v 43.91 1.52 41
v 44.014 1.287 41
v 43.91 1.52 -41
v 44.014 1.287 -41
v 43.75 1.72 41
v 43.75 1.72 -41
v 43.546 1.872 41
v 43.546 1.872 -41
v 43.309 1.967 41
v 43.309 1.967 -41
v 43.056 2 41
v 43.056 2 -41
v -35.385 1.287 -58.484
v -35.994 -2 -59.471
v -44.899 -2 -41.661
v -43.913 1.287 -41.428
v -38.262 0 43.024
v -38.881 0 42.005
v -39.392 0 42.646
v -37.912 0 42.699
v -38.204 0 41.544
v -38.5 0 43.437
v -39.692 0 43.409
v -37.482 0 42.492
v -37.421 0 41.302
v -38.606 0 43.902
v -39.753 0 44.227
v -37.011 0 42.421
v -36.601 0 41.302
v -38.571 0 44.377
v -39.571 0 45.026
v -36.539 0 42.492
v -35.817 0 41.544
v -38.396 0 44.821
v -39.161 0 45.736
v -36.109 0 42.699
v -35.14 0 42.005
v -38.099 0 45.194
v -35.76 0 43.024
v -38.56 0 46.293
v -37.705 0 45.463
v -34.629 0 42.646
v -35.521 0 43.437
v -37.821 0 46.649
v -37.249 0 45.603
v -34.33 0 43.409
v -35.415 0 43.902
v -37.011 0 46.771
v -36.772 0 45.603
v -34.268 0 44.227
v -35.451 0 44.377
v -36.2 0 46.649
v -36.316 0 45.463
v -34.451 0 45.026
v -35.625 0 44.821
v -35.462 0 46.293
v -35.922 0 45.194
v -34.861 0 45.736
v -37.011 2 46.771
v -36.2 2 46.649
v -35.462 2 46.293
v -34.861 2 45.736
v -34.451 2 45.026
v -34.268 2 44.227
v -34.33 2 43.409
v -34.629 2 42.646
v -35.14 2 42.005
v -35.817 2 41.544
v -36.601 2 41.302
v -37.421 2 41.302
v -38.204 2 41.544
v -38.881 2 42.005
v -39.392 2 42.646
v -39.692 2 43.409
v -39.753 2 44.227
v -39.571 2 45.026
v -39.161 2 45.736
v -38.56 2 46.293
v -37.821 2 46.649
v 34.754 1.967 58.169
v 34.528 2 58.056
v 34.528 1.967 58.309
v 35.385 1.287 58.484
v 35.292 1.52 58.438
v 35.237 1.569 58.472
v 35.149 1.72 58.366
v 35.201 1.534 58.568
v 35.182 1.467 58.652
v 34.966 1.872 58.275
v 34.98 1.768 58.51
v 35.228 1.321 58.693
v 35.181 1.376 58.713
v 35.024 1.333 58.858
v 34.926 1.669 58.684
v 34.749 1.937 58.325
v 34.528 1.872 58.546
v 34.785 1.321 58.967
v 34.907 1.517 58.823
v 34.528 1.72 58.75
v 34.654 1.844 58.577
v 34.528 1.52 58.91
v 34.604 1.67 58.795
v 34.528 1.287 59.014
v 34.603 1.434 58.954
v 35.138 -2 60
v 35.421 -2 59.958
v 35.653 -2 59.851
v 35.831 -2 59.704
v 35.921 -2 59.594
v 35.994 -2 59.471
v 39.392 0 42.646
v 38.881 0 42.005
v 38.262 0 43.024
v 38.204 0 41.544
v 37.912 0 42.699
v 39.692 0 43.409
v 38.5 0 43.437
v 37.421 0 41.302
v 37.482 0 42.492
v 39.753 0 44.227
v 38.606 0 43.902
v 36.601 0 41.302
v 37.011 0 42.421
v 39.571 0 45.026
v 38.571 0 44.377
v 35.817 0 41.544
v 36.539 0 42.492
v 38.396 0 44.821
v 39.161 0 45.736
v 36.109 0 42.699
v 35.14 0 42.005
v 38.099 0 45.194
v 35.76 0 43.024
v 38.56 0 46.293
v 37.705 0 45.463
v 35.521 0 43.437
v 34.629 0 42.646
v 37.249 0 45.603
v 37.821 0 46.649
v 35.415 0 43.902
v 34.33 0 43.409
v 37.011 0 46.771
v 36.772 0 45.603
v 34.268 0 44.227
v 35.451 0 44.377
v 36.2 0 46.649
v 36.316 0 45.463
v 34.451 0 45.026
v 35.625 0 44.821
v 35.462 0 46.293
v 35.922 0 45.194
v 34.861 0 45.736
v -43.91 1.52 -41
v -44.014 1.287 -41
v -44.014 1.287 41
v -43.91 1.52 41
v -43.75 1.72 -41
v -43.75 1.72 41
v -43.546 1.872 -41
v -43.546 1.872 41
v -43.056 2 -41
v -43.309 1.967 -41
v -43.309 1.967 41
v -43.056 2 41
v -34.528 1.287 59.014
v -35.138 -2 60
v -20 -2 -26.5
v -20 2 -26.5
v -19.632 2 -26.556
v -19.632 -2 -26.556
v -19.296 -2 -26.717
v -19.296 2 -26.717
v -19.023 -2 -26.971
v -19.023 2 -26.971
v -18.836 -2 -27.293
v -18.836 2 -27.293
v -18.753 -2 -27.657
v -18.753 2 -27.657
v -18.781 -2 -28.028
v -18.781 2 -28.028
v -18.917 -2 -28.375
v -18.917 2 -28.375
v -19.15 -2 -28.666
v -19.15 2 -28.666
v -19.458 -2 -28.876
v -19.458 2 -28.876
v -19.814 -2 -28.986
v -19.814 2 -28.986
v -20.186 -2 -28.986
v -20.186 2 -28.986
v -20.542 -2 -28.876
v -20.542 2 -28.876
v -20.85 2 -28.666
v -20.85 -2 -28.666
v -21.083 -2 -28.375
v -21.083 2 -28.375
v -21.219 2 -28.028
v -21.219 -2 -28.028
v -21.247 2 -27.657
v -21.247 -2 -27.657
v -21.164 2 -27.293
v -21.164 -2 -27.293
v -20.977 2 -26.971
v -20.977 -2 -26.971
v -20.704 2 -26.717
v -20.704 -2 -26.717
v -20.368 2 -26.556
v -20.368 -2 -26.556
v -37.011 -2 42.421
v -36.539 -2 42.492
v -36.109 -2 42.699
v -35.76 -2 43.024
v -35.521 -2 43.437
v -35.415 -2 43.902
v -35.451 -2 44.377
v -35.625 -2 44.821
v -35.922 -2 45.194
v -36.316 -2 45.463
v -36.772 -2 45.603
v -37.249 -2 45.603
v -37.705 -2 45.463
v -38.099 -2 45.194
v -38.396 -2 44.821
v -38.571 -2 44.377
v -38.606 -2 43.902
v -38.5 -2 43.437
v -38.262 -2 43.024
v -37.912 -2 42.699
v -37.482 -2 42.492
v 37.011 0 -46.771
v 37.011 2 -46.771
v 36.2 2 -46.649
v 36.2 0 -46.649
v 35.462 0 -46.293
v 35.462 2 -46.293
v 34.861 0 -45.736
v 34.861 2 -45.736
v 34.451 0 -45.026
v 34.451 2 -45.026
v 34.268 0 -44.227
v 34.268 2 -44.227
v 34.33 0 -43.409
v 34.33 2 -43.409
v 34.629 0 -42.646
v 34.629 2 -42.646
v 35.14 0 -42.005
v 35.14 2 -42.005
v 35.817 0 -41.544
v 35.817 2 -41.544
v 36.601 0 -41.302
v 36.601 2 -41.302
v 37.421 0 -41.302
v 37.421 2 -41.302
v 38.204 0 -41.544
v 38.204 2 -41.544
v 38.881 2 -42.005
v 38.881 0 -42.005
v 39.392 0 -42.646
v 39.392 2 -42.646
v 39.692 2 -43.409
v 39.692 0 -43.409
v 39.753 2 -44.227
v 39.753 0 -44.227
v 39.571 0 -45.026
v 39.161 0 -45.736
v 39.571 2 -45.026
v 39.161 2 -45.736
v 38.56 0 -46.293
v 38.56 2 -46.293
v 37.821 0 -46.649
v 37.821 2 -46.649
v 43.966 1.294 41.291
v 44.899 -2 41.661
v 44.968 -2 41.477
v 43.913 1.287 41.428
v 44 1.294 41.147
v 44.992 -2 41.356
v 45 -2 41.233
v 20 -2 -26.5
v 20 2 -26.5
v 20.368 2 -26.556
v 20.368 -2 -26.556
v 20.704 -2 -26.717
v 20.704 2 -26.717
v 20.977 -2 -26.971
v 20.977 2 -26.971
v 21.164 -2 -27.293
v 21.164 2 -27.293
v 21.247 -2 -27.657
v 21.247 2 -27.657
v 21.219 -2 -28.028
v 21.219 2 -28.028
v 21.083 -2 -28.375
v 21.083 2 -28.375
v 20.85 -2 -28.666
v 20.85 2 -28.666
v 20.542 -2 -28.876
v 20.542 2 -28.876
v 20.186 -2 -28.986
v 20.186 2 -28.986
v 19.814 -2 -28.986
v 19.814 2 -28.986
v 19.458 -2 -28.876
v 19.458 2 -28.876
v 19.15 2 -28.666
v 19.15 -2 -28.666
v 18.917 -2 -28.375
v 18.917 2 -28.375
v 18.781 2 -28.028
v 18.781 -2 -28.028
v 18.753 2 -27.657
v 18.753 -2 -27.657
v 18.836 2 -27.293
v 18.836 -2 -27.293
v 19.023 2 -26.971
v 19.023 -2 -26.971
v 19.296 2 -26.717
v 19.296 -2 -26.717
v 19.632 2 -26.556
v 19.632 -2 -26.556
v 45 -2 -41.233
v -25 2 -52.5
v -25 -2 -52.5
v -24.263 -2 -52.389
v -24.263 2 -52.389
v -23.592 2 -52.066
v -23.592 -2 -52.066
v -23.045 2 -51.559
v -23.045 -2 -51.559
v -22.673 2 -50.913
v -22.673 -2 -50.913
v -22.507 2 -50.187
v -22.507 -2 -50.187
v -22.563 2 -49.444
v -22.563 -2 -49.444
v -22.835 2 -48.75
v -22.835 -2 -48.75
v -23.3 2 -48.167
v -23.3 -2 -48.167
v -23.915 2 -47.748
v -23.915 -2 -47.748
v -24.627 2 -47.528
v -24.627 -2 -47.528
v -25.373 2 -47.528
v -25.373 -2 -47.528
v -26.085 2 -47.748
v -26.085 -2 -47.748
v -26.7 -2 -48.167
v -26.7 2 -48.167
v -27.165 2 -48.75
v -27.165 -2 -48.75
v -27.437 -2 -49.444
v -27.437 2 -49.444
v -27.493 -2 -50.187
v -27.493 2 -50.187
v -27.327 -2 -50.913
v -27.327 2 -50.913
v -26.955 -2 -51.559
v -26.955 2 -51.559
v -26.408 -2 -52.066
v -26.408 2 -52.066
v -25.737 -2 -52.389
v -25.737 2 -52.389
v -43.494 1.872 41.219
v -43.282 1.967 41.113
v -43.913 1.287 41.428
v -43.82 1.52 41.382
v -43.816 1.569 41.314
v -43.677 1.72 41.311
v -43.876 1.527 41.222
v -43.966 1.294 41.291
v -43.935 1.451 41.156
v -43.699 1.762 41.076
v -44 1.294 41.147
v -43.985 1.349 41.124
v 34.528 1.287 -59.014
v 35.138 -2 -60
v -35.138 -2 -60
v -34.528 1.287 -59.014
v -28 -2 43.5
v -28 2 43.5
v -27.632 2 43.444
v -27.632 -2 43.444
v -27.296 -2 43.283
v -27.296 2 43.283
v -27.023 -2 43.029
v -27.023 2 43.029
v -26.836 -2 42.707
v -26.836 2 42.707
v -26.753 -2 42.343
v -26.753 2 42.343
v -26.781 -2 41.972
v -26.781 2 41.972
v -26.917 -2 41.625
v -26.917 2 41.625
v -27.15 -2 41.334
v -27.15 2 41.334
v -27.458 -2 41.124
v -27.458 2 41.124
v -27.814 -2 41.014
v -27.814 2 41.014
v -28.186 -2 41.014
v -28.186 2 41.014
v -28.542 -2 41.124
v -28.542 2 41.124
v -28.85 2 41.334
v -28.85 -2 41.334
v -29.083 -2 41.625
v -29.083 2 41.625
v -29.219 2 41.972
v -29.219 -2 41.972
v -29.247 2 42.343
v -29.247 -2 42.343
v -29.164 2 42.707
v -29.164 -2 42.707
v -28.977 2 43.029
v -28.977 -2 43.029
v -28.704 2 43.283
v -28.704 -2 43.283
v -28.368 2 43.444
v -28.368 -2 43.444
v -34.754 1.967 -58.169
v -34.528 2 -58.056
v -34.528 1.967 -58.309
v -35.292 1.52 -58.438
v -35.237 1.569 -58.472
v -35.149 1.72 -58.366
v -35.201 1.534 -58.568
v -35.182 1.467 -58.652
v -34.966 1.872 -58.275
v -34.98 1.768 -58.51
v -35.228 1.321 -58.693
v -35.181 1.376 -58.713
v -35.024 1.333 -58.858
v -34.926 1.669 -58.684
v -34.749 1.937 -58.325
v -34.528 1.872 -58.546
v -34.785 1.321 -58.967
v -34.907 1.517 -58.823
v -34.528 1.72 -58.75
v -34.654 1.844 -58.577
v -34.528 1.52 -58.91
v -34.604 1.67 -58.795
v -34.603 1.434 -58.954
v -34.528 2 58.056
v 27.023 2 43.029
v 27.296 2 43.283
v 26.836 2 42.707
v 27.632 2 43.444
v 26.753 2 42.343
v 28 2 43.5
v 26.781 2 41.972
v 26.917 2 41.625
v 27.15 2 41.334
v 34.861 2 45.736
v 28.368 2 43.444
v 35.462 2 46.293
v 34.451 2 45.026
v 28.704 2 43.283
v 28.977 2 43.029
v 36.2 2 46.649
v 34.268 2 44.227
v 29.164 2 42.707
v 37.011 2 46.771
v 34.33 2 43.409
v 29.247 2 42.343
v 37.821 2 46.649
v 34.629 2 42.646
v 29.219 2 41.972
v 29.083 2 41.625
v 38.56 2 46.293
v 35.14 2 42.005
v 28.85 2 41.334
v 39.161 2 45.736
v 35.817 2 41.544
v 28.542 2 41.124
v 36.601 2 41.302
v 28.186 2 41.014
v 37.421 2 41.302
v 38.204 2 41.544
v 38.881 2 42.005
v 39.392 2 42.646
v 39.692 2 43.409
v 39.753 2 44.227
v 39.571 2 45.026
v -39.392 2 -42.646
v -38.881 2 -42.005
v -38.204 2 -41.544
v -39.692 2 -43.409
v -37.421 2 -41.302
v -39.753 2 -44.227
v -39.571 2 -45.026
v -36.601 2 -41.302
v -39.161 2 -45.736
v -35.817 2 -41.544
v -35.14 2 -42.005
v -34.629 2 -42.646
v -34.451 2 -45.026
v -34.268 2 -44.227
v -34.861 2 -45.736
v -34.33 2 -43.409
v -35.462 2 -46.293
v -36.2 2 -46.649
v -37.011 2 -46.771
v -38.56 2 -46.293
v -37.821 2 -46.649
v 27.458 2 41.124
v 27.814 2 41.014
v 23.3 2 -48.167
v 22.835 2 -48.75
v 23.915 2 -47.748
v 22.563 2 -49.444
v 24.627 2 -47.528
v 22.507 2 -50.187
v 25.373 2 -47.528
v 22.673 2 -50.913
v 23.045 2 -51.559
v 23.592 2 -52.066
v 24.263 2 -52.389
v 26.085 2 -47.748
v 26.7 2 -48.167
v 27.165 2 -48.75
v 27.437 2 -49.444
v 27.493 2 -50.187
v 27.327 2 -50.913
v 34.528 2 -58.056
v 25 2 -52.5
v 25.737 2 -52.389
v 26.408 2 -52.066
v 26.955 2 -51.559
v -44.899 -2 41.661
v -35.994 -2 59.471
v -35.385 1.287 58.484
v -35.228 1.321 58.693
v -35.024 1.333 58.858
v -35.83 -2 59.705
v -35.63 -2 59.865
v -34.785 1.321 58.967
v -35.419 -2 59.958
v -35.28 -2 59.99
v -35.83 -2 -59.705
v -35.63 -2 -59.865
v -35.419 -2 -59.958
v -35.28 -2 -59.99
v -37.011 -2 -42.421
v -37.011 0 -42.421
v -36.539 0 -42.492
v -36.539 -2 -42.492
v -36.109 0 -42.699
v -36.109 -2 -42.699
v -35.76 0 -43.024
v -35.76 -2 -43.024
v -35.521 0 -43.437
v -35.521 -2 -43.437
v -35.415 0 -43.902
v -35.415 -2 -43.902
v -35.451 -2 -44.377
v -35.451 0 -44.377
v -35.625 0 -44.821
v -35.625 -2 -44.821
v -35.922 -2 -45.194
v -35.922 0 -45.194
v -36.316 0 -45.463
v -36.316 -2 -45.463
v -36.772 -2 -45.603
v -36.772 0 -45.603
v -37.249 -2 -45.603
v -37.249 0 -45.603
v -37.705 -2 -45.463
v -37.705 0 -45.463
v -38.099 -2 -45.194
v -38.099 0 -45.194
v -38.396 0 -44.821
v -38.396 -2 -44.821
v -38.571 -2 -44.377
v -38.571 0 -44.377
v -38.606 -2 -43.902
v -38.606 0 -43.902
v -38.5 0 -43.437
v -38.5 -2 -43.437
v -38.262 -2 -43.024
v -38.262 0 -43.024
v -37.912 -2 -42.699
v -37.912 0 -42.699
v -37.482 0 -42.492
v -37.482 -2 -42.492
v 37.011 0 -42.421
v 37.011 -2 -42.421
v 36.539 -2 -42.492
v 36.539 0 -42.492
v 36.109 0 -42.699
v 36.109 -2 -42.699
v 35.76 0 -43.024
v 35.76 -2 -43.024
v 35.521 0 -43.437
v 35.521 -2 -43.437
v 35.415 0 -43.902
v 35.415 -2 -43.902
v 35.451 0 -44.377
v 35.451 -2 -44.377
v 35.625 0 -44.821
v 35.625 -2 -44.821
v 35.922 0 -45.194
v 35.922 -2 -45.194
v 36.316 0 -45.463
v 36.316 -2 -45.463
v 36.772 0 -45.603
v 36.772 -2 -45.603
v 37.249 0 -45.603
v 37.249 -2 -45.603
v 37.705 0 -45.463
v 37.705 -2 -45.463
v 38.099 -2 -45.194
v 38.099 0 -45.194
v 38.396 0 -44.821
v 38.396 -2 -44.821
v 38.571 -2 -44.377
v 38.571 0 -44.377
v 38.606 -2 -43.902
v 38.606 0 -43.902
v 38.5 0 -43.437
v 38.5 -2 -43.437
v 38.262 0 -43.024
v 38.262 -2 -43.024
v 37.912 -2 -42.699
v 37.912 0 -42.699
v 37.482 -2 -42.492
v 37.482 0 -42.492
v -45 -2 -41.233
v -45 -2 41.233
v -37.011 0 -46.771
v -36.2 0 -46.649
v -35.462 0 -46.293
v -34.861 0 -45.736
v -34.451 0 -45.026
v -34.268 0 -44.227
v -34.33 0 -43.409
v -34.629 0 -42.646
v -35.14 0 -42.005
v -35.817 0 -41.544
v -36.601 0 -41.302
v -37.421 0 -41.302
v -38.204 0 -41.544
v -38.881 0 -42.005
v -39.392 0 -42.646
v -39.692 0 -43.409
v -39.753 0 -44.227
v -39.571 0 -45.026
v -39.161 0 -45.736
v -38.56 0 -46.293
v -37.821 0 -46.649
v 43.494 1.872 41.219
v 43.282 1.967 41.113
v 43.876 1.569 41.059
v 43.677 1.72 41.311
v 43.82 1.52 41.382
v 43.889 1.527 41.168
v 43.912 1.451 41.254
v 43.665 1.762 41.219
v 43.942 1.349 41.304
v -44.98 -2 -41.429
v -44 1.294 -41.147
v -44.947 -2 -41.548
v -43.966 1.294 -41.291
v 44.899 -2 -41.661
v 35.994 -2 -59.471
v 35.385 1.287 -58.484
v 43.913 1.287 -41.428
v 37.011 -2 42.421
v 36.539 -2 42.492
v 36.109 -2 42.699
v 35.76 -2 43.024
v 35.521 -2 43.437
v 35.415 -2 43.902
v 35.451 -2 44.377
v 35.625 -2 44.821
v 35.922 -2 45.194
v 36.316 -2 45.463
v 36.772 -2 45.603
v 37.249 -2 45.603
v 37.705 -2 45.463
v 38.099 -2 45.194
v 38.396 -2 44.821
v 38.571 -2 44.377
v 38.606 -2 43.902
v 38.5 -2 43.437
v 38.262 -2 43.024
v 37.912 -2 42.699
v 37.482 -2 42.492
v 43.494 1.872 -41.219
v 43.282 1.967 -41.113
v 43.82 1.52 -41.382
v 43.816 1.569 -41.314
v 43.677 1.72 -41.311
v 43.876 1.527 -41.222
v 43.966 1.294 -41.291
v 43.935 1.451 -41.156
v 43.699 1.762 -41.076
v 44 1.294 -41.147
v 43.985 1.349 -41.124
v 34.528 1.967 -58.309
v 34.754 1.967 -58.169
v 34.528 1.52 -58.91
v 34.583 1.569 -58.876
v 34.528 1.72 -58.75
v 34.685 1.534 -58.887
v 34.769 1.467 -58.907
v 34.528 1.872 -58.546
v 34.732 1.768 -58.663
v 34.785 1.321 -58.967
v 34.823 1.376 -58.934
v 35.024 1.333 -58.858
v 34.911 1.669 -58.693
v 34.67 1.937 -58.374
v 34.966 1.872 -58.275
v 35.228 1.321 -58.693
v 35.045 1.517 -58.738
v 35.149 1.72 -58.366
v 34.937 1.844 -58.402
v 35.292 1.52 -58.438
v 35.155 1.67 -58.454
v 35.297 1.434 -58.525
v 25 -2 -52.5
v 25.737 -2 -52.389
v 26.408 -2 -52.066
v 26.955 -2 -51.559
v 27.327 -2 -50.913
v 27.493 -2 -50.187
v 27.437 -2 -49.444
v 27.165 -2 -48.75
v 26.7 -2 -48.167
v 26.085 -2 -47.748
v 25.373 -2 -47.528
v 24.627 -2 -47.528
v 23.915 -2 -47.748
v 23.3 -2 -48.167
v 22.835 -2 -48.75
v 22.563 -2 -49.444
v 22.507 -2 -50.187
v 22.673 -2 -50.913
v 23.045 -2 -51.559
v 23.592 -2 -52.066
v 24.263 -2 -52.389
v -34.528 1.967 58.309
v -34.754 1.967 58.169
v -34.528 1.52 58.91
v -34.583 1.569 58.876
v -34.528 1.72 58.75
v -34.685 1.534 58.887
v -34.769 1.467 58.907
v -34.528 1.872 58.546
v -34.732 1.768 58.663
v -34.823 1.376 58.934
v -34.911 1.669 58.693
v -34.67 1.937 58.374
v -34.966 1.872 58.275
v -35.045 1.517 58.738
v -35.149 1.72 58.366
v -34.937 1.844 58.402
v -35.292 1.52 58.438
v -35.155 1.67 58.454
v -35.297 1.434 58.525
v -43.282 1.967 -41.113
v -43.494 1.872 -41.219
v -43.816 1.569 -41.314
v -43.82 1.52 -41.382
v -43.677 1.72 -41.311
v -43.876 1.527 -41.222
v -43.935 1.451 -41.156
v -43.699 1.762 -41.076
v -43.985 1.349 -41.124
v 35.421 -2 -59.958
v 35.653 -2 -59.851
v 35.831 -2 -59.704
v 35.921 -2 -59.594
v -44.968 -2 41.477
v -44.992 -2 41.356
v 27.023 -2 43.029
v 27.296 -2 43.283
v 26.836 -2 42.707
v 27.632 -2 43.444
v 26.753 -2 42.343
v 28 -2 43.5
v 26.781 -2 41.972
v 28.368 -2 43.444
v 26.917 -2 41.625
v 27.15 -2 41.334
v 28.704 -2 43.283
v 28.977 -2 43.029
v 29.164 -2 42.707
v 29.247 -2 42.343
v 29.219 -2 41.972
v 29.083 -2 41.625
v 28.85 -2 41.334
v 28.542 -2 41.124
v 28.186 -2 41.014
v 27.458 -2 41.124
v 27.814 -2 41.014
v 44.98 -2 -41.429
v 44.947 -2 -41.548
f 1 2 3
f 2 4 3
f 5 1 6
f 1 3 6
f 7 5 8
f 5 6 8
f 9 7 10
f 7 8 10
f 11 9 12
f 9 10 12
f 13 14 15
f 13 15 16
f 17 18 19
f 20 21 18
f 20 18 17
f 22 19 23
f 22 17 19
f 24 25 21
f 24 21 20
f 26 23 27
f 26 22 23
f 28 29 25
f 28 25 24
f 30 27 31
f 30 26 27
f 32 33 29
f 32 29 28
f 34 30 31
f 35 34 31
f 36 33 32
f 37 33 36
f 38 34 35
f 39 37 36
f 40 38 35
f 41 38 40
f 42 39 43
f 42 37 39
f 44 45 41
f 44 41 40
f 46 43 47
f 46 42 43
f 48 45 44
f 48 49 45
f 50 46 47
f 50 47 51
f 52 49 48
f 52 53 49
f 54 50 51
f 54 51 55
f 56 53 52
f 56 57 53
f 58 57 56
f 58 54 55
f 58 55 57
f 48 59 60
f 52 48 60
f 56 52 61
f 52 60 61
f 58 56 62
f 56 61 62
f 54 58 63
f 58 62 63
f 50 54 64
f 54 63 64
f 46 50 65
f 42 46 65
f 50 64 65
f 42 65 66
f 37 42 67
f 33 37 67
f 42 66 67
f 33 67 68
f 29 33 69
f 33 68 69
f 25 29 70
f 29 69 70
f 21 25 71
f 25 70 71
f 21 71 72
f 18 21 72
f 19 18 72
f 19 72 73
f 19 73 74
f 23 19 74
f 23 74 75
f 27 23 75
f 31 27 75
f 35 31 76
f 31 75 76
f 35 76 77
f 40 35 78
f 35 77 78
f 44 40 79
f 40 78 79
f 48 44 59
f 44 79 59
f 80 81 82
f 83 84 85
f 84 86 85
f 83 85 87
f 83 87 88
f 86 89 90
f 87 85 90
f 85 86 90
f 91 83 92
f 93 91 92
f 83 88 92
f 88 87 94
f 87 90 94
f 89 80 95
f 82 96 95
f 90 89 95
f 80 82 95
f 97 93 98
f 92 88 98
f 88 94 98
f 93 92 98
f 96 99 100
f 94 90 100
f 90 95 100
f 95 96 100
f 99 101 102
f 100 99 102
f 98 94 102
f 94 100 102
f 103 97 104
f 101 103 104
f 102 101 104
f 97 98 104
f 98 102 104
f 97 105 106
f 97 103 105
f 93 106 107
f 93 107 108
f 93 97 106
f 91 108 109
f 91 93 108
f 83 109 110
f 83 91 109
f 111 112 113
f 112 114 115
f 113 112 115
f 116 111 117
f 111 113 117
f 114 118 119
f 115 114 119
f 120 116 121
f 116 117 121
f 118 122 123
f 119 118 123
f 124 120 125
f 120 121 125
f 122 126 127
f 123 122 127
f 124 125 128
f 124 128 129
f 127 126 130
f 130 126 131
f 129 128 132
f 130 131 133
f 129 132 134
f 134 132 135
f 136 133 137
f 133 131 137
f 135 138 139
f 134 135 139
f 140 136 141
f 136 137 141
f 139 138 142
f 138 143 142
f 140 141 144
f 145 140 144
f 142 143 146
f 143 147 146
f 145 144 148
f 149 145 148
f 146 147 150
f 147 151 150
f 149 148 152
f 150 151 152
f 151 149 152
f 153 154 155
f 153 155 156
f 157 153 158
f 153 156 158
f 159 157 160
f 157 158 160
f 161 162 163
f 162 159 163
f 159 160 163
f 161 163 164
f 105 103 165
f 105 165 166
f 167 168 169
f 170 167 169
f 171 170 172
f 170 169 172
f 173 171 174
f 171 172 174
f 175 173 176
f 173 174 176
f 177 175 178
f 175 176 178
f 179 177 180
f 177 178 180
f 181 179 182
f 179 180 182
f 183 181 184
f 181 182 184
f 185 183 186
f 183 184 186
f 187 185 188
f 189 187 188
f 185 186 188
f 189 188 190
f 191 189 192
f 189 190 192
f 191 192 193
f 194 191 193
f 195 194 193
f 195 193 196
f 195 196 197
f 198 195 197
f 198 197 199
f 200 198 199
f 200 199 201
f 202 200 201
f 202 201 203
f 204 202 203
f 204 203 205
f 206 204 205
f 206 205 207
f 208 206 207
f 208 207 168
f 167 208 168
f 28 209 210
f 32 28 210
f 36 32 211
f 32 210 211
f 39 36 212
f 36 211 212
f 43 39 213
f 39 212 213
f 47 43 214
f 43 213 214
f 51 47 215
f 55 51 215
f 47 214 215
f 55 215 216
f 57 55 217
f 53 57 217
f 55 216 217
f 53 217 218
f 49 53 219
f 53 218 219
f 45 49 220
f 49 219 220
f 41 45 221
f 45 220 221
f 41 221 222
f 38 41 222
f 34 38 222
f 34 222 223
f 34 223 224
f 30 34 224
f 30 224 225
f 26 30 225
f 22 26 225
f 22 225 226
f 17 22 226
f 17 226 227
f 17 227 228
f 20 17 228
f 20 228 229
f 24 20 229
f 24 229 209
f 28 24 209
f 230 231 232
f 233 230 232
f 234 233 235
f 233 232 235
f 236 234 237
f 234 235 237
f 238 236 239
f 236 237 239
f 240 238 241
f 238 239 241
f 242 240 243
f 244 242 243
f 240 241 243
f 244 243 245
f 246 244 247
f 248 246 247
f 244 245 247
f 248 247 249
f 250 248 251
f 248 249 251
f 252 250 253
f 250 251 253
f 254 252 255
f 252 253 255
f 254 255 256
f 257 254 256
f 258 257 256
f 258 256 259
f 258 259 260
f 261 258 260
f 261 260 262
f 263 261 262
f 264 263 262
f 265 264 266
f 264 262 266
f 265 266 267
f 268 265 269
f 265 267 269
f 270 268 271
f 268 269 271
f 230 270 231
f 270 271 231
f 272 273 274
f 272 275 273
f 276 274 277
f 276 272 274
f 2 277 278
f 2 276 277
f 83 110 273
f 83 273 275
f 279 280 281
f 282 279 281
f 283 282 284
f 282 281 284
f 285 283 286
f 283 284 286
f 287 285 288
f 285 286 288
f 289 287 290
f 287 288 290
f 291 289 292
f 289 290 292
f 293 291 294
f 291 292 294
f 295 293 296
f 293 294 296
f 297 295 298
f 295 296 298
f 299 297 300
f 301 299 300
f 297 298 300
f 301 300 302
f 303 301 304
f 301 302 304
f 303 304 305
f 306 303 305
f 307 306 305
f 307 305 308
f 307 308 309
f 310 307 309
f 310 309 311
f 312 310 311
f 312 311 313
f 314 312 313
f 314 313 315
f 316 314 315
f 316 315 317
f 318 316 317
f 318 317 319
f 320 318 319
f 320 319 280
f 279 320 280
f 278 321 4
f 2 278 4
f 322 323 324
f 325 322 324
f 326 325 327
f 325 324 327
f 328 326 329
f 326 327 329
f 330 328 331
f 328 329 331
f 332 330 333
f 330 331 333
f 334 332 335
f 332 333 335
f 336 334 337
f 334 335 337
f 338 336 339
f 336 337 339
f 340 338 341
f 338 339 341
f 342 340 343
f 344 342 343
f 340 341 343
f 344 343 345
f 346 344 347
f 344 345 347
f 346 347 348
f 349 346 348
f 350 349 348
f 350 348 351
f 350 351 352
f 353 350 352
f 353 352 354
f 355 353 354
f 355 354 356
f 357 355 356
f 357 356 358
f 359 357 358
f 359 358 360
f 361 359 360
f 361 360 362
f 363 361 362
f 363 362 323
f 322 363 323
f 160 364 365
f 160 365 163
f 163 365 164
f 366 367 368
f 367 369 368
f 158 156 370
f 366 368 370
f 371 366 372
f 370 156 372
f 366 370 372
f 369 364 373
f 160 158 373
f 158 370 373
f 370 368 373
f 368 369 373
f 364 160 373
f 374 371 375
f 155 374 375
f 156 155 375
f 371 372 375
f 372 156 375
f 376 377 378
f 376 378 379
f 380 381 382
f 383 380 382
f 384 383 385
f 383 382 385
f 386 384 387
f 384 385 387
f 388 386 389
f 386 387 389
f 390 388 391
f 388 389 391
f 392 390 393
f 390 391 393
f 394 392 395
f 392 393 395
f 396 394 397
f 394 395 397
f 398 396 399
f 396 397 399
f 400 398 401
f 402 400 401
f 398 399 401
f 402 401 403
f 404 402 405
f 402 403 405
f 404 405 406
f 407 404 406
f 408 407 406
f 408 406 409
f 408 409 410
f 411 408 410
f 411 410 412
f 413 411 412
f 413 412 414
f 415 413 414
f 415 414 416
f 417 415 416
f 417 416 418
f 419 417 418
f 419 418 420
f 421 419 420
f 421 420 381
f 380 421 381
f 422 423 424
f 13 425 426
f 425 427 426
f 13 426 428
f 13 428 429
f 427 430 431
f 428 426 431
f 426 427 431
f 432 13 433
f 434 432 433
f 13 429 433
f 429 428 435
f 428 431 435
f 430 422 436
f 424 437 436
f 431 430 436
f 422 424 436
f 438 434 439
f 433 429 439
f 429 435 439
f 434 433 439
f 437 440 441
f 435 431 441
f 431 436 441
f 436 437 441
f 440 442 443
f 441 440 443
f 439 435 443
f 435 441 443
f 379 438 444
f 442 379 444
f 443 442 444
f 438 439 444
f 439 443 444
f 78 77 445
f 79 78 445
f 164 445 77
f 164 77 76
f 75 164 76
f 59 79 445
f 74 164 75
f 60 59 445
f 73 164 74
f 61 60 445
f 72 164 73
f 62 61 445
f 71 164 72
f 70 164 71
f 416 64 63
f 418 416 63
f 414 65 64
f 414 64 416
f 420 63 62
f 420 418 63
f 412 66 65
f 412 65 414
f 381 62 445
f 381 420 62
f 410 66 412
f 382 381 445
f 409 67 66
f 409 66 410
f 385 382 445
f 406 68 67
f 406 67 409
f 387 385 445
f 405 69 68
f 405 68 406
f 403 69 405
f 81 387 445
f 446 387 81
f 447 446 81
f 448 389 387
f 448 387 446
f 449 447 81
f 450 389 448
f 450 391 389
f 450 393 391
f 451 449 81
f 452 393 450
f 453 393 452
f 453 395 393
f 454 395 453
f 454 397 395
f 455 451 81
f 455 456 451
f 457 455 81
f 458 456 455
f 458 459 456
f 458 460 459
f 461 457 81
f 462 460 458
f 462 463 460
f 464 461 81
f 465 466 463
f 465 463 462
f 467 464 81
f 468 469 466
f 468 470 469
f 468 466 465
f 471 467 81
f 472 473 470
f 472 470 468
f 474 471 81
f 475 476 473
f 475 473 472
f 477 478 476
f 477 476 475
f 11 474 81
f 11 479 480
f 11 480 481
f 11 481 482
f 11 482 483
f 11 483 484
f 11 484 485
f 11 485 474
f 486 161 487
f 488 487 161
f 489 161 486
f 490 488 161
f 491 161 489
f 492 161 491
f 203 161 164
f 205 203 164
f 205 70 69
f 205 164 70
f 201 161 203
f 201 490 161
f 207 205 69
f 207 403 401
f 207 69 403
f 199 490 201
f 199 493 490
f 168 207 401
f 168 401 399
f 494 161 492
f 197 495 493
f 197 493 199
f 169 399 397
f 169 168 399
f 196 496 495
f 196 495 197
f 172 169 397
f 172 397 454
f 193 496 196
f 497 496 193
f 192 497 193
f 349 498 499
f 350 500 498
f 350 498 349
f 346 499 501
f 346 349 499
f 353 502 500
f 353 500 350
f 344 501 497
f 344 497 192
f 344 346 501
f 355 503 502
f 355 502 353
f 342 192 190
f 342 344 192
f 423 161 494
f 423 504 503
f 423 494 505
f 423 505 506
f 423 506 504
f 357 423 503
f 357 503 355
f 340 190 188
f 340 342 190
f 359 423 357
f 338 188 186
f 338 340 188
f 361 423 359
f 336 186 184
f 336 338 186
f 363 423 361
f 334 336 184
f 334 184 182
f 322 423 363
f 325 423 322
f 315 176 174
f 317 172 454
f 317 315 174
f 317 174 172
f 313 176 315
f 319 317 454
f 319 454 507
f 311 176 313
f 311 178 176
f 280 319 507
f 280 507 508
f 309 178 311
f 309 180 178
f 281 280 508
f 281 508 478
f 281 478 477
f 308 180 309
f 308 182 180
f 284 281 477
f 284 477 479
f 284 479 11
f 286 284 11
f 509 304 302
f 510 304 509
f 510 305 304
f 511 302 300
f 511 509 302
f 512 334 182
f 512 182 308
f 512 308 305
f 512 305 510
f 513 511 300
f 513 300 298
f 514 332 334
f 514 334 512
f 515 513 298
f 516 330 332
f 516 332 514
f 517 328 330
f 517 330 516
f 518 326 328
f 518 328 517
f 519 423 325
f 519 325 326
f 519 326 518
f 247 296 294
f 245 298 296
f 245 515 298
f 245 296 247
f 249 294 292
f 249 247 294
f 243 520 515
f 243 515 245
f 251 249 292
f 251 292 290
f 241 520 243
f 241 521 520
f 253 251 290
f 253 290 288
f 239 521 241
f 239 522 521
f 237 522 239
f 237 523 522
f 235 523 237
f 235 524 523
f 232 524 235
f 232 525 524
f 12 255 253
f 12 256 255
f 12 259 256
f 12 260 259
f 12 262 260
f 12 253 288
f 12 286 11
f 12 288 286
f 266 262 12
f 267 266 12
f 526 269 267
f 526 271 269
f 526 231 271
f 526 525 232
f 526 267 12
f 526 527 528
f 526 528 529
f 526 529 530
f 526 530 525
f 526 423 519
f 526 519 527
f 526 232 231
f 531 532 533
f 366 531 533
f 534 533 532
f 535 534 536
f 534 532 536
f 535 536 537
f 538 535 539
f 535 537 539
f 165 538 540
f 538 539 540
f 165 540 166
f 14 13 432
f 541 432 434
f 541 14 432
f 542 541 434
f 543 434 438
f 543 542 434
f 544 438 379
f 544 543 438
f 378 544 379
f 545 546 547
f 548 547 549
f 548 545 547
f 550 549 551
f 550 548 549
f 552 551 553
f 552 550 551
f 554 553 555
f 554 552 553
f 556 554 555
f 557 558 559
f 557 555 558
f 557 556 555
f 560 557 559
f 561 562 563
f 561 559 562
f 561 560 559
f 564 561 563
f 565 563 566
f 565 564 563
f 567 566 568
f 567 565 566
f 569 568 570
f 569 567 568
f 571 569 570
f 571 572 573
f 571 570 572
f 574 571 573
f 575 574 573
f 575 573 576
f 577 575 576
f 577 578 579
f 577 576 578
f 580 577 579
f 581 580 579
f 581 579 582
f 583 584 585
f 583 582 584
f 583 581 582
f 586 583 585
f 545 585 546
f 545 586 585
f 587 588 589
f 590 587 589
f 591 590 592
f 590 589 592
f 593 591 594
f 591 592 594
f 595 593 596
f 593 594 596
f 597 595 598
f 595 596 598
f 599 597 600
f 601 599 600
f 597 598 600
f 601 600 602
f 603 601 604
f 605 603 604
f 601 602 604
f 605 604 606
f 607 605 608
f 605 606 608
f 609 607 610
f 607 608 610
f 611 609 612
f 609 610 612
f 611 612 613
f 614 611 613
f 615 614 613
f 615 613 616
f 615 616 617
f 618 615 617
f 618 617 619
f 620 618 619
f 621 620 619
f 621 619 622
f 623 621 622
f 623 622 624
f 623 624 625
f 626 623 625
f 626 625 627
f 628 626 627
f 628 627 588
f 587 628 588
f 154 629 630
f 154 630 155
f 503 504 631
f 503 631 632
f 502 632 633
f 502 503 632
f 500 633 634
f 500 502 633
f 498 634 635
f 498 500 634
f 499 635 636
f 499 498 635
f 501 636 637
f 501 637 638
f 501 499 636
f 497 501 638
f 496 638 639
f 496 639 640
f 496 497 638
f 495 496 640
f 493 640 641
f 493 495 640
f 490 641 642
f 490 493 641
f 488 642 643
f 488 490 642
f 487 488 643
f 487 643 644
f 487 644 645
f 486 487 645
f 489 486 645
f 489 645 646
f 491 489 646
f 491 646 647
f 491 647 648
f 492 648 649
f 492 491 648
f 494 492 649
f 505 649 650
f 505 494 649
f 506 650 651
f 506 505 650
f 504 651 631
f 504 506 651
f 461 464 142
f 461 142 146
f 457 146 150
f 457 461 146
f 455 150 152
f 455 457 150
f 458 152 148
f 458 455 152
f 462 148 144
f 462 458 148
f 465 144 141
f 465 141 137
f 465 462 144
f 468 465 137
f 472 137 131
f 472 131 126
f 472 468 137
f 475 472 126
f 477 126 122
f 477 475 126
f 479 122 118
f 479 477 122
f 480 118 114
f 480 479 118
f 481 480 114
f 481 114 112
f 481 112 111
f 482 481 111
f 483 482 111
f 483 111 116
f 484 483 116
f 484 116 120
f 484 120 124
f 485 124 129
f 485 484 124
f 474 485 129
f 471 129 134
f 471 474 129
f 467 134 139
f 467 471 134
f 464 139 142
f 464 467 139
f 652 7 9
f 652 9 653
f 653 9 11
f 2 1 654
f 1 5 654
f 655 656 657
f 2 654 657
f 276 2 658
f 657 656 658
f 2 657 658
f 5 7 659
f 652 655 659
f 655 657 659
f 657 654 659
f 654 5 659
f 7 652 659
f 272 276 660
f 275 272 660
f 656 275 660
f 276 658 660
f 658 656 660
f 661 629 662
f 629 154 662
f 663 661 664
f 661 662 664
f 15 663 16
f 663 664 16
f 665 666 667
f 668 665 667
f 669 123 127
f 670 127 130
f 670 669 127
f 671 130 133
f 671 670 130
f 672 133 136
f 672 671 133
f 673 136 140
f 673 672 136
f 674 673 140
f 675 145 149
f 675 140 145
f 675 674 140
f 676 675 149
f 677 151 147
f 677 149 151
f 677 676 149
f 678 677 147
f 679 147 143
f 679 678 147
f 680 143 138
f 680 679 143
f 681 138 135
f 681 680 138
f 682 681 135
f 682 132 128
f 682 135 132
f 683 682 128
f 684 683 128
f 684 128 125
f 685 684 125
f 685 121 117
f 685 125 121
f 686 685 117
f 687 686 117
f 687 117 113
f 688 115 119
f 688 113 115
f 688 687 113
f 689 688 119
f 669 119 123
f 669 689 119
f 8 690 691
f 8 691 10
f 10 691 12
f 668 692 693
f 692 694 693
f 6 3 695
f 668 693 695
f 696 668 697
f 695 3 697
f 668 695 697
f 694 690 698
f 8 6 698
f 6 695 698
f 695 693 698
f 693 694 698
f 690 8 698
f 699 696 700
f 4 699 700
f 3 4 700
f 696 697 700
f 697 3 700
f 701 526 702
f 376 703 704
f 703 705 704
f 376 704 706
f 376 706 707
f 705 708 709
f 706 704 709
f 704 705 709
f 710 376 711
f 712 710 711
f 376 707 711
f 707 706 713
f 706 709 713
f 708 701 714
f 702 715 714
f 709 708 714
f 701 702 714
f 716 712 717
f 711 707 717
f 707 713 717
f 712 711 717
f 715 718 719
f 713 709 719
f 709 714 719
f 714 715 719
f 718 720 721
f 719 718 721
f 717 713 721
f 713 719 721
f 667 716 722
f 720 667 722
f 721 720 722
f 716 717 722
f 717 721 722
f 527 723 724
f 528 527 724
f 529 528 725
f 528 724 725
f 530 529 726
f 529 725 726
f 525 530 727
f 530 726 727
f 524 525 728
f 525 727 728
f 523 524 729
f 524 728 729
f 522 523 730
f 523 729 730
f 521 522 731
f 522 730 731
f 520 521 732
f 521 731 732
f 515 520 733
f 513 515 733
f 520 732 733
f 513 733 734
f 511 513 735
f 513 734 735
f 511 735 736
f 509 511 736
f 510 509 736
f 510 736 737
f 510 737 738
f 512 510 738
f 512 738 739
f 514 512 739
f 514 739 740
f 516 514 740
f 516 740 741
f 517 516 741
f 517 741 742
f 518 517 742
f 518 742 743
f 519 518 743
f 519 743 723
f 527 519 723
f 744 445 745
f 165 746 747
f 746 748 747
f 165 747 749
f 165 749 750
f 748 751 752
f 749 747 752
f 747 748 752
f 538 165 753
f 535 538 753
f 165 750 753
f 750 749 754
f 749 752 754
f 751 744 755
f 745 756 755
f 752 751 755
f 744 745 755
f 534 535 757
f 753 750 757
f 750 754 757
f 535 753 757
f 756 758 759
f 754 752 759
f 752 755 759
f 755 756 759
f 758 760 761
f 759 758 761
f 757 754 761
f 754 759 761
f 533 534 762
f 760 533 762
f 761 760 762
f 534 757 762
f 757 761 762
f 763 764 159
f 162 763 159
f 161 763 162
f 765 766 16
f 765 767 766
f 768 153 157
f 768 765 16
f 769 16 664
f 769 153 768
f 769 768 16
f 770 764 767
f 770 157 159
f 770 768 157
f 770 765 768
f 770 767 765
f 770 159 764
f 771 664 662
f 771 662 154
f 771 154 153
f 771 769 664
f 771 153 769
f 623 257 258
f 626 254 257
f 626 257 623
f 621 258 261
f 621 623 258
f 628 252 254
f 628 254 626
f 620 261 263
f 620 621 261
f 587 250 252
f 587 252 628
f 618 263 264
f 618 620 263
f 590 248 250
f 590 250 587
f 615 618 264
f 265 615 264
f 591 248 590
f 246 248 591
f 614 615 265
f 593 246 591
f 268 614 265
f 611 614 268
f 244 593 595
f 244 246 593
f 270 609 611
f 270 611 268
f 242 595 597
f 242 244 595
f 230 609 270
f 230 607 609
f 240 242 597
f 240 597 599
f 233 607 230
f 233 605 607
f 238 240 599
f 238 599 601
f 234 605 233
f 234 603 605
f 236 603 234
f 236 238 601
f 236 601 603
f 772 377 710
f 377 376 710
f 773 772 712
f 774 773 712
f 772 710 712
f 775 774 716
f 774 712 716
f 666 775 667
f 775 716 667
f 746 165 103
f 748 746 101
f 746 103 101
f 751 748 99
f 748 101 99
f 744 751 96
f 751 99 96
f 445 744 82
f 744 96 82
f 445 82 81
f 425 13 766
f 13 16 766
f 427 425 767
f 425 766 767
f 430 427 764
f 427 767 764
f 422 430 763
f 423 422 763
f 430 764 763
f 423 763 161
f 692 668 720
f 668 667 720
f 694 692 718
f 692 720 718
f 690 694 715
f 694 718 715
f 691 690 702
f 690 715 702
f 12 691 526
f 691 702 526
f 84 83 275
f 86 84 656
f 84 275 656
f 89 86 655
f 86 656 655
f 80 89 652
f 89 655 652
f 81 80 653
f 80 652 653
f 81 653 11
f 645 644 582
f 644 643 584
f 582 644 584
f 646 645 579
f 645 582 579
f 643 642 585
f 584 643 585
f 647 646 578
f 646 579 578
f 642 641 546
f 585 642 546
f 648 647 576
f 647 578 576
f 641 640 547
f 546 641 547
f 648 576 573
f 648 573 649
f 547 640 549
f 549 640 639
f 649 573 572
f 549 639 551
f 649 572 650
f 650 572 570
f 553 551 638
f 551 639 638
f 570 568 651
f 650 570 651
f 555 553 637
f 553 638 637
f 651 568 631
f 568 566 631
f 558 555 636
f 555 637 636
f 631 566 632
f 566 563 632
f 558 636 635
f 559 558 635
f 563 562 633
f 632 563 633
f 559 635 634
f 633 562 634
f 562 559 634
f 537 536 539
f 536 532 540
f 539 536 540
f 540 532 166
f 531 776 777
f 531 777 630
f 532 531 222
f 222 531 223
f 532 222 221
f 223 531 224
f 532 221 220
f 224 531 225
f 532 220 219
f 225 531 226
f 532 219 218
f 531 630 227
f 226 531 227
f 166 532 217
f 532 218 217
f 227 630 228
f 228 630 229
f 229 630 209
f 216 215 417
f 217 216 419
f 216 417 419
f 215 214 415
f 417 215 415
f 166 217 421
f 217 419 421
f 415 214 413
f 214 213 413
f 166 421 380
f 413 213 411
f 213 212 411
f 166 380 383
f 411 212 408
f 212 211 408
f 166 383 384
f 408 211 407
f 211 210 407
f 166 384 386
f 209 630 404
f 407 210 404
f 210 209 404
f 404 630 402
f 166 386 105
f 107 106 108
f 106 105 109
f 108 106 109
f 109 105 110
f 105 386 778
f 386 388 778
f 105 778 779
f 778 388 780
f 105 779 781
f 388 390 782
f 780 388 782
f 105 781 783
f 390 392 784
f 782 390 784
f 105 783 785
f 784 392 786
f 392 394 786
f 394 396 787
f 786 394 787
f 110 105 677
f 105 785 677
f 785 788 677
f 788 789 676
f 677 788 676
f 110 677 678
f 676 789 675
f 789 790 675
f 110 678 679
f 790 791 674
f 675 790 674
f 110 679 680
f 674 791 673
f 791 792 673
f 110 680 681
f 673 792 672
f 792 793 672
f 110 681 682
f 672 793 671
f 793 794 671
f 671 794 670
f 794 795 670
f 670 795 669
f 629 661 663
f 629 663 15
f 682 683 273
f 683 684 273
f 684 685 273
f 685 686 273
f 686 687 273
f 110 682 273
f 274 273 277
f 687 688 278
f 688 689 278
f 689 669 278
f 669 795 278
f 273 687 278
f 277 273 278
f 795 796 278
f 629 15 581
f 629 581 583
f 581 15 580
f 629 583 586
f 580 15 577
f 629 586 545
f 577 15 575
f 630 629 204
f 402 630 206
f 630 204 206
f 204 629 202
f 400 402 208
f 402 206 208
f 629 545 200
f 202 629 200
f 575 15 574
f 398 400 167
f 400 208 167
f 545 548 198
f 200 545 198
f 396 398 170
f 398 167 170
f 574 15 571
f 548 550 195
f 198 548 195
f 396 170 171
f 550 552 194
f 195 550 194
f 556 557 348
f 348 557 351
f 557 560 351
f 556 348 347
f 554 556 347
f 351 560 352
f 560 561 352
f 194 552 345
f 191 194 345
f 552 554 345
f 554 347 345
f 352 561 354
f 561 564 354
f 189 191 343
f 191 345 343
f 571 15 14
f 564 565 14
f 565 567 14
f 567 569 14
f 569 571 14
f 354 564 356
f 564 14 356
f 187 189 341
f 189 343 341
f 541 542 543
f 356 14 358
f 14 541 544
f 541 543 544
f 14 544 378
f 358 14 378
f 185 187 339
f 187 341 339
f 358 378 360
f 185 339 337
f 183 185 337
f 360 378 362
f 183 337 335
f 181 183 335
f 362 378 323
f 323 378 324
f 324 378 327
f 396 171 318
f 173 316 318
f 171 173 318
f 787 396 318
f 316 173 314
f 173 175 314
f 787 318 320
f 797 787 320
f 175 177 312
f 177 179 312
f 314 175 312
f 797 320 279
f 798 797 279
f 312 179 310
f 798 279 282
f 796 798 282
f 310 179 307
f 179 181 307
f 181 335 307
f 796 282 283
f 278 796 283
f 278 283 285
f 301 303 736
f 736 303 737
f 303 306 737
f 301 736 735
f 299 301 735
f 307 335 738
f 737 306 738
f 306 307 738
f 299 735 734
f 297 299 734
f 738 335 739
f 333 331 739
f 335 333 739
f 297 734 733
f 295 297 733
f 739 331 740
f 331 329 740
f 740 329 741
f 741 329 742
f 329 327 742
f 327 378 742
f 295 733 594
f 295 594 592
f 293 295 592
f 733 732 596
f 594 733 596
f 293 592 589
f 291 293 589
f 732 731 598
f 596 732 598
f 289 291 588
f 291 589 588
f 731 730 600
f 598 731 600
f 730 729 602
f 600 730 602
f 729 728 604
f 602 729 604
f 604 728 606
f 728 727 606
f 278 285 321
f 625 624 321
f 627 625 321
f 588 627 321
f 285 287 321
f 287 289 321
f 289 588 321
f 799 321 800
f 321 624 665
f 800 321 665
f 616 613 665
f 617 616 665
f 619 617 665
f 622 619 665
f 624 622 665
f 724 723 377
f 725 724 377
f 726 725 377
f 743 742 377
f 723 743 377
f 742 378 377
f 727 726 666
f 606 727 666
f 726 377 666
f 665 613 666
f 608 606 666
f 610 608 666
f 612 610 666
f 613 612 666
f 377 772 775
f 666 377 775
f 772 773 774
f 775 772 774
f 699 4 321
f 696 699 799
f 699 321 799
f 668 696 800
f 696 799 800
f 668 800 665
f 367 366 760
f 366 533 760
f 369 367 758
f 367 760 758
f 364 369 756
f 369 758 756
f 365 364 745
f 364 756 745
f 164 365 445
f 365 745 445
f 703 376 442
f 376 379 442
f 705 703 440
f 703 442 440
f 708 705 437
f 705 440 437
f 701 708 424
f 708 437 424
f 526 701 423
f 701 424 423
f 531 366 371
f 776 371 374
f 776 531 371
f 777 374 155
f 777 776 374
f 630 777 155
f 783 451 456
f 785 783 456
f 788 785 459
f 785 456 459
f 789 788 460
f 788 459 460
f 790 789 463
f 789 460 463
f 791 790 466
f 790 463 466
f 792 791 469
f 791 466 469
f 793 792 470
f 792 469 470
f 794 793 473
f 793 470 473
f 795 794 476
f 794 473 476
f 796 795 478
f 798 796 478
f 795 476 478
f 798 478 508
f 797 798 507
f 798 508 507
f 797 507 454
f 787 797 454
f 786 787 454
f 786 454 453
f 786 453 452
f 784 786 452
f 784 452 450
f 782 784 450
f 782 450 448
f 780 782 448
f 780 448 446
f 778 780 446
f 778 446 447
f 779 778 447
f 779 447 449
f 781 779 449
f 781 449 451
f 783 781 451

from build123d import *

# Parameters (mm, degrees)
BOSS_EXTRUDE1_DEPTH     = 2
CHAMFER1_SIZE           = 4
CHAMFER1_SIZE_2         = 1.200057511
SKETCH2_R               = 1.6
CUT_EXTRUDE1_DEPTH      = 76.106590923
SKETCH3_R               = 2.75
CUT_EXTRUDE2_DEPTH      = 2
MIRROR2_COPY_1_SKETCH_R = 1.6
MIRROR2_COPY_1_DEPTH    = 76.106590923
MIRROR2_COPY_2_SKETCH_R = 2.75
MIRROR2_COPY_2_DEPTH    = 2
FILLET1_R               = 1
SKETCH4_R               = 1.25
CUT_EXTRUDE3_DEPTH      = 76.106590923
SKETCH5_R               = 2.5
CUT_EXTRUDE4_DEPTH      = 76.106590923


with BuildPart() as part:
    # Sketch1 → Boss-Extrude1 (new, symmetric)
    with BuildSketch(Plane(origin=(0, 0, 0), x_dir=(1, 0, 0), z_dir=(0, 1, 0))):
        Polygon((-45, -41.45898034), (-35.72949017, -60), (35.72949017, -60), (45, -41.45898034), (45, 41.45898034), (35.72949017, 60), (-35.72949017, 60), (-45, 41.45898034), align=None)
    extrude(amount=BOSS_EXTRUDE1_DEPTH, both=True)

    # Chamfer1
    # the kernel refuses this chamfer: 4, 1.200057511 mm, written as the material it takes off along each edge
    with BuildSketch(Plane(origin=(-31.085729195, 2, -69.28752195), x_dir=(-0.0099009581726386, -0.9999387300150343, -0.004950479086319294), z_dir=(-0.44721359549995754, 0, 0.8944271909999161)), Plane(origin=(49.643760975, 2, -32.17145839), x_dir=(0.009900958172639964, -0.9999387300150343, -0.004950479086319981), z_dir=(-0.4472135954999578, 0, -0.894427190999916)), Plane(origin=(31.085729195, 2, 69.28752195), x_dir=(0.009900958172639964, -0.9999387300150343, 0.004950479086319981), z_dir=(0.4472135954999578, 0, -0.894427190999916)), Plane(origin=(-49.643760975, 2, 32.17145839), x_dir=(-0.009900958172639964, -0.9999387300150343, 0.004950479086319981), z_dir=(0.4472135954999578, 0, 0.894427190999916))) as chamfer1_piece_1:
        Polygon((CHAMFER1_SIZE * 0.999938730015, CHAMFER1_SIZE * 0.0110696077582), (-CHAMFER1_SIZE_2 * 0.0110696077607, CHAMFER1_SIZE_2 * 0.999938730237), (0, 0), align=None)
    extrude(amount=41.497020588, mode=Mode.SUBTRACT)
    with BuildSketch(Plane(origin=(46.113255381, 2, -60), x_dir=(0, -0.9999387300150343, -0.011069607758202806), z_dir=(-1, 0, 0))) as chamfer1_piece_2:
        Polygon((CHAMFER1_SIZE * 0.999938730015, CHAMFER1_SIZE * 0.0110696077582), (-CHAMFER1_SIZE_2 * 0.0110696077607, CHAMFER1_SIZE_2 * 0.999938730237), (0, 0), align=None)
    extrude(amount=92.226510762, mode=Mode.SUBTRACT)
    with BuildSketch(Plane(origin=(45, 2, 51.842745551), x_dir=(0.011069607758202806, -0.9999387300150343, 0), z_dir=(0, 0, -1)), Plane(origin=(-45, 2, -51.842745551), x_dir=(-0.011069607758202806, -0.9999387300150343, 0), z_dir=(0, 0, 1))) as chamfer1_piece_3:
        Polygon((CHAMFER1_SIZE * 0.999938730015, CHAMFER1_SIZE * 0.0110696077582), (-CHAMFER1_SIZE_2 * 0.0110696077607, CHAMFER1_SIZE_2 * 0.999938730237), (0, 0), align=None)
    extrude(amount=103.685491102, mode=Mode.SUBTRACT)
    with BuildSketch(Plane(origin=(-46.113255381, 2, 60), x_dir=(0, 0.12207157319780508, -0.9925213000319), z_dir=(1, 0, 0))) as chamfer1_piece_4:
        Polygon((CHAMFER1_SIZE_2 * 0.992521300252, -CHAMFER1_SIZE_2 * 0.122071573225), (-CHAMFER1_SIZE * 0.122071573198, -CHAMFER1_SIZE * 0.992521300032), (0, 0), align=None)
    extrude(amount=92.226510762, mode=Mode.SUBTRACT)

    # Sketch2 → Cut-Extrude1 (cut, through all)
    with BuildSketch(Plane.XZ.offset(2)):
        with Locations(Location((-37.010643118, 44.021286236, 0), (0, 0, 270))):
            Circle(SKETCH2_R)
    cut_extrude1 = extrude(amount=-CUT_EXTRUDE1_DEPTH, mode=Mode.SUBTRACT)

    # Sketch3 → Cut-Extrude2 (cut)
    with BuildSketch(Plane(origin=(0, 2, 0), x_dir=(1, 0, 0), z_dir=(0, 1, 0))):
        with Locations(Location((-37.010643118, -44.021286236, 0), (0, 0, 270))):
            Circle(SKETCH3_R)
    cut_extrude2 = extrude(amount=-CUT_EXTRUDE2_DEPTH, mode=Mode.SUBTRACT)

    # Mirror1: Cut-Extrude1, Cut-Extrude2 across plane
    add(cut_extrude1.mirror(Plane(origin=(0, 0, 0), x_dir=(0, 0, 1), z_dir=(1, 0, 0))), mode=Mode.SUBTRACT)
    add(cut_extrude2.mirror(Plane(origin=(0, 0, 0), x_dir=(0, 0, 1), z_dir=(1, 0, 0))), mode=Mode.SUBTRACT)

    # Mirror2: Cut-Extrude1, Cut-Extrude2 across plane
    add(cut_extrude1.mirror(Plane.XY), mode=Mode.SUBTRACT)
    add(cut_extrude2.mirror(Plane.XY), mode=Mode.SUBTRACT)

    # Mirror2 copy 1 sketch → Mirror2 copy 1 (cut, through all)
    with BuildSketch(Plane(origin=(0, -2, 0), x_dir=(-1, 0, 0), z_dir=(0, -1, 0))):
        with Locations(Location((-37.010643118, 44.021286236, 0), (0, 0, 270))):
            Circle(MIRROR2_COPY_1_SKETCH_R)
    extrude(amount=-MIRROR2_COPY_1_DEPTH, mode=Mode.SUBTRACT)

    # Mirror2 copy 2 sketch → Mirror2 copy 2 (cut)
    with BuildSketch(Plane(origin=(0, 2, 0), x_dir=(-1, 0, 0), z_dir=(0, 1, 0))):
        with Locations(Location((-37.010643118, -44.021286236, 0), (0, 0, 270))):
            Circle(MIRROR2_COPY_2_SKETCH_R)
    extrude(amount=-MIRROR2_COPY_2_DEPTH, mode=Mode.SUBTRACT)

    # Fillet1
    fillet1_edges = [part.edges().sort_by_distance(p)[0] for p in [
        (-43.799942489, 2, 0),
        (-39.393878164, 2, 49.98781384),
        (0, 2, 58.799942489),
        (39.393878164, 2, 49.98781384),
        (43.799942489, 2, 0),
        (39.393878164, 2, -49.98781384),
        (0, 2, -58.799942489),
        (-39.393878164, 2, -49.98781384),
        (44.399971244, 0, 41.317332765),
        (35.358652005, 0, 59.399971244),
        (44.399971244, 0, -41.317332765),
        (-35.358652005, 0, 59.399971244),
        (35.358652005, 0, -59.399971244),
        (-44.399971244, 0, 41.317332765),
        (-35.358652005, 0, -59.399971244),
        (-44.399971244, 0, -41.317332765),
    ]]
    fillet(fillet1_edges, radius=FILLET1_R)

    # Sketch4 → Cut-Extrude3 (cut, through all)
    with BuildSketch(Plane(origin=(0, 2, 0), x_dir=(1, 0, 0), z_dir=(0, 1, 0))):
        with Locations(Location((-20, 27.75, 0), (0, 0, 270))):
            Circle(SKETCH4_R)
        with Locations(Location((-28, -42.25, 0), (0, 0, 270))):
            Circle(SKETCH4_R)
        with Locations(Location((20, 27.75, 0), (0, 0, 270))):
            Circle(SKETCH4_R)
        with Locations(Location((28, -42.25, 0), (0, 0, 270))):
            Circle(SKETCH4_R)
    extrude(amount=-CUT_EXTRUDE3_DEPTH, mode=Mode.SUBTRACT)

    # Sketch5 → Cut-Extrude4 (cut, through all)
    with BuildSketch(Plane.XZ.offset(2)):
        with Locations(Location((25, -50, 0), (0, 0, 270))):
            Circle(SKETCH5_R)
        with Locations(Location((-25, -50, 0), (0, 0, 270))):
            Circle(SKETCH5_R)
    extrude(amount=-CUT_EXTRUDE4_DEPTH, mode=Mode.SUBTRACT)


solid = part.part
